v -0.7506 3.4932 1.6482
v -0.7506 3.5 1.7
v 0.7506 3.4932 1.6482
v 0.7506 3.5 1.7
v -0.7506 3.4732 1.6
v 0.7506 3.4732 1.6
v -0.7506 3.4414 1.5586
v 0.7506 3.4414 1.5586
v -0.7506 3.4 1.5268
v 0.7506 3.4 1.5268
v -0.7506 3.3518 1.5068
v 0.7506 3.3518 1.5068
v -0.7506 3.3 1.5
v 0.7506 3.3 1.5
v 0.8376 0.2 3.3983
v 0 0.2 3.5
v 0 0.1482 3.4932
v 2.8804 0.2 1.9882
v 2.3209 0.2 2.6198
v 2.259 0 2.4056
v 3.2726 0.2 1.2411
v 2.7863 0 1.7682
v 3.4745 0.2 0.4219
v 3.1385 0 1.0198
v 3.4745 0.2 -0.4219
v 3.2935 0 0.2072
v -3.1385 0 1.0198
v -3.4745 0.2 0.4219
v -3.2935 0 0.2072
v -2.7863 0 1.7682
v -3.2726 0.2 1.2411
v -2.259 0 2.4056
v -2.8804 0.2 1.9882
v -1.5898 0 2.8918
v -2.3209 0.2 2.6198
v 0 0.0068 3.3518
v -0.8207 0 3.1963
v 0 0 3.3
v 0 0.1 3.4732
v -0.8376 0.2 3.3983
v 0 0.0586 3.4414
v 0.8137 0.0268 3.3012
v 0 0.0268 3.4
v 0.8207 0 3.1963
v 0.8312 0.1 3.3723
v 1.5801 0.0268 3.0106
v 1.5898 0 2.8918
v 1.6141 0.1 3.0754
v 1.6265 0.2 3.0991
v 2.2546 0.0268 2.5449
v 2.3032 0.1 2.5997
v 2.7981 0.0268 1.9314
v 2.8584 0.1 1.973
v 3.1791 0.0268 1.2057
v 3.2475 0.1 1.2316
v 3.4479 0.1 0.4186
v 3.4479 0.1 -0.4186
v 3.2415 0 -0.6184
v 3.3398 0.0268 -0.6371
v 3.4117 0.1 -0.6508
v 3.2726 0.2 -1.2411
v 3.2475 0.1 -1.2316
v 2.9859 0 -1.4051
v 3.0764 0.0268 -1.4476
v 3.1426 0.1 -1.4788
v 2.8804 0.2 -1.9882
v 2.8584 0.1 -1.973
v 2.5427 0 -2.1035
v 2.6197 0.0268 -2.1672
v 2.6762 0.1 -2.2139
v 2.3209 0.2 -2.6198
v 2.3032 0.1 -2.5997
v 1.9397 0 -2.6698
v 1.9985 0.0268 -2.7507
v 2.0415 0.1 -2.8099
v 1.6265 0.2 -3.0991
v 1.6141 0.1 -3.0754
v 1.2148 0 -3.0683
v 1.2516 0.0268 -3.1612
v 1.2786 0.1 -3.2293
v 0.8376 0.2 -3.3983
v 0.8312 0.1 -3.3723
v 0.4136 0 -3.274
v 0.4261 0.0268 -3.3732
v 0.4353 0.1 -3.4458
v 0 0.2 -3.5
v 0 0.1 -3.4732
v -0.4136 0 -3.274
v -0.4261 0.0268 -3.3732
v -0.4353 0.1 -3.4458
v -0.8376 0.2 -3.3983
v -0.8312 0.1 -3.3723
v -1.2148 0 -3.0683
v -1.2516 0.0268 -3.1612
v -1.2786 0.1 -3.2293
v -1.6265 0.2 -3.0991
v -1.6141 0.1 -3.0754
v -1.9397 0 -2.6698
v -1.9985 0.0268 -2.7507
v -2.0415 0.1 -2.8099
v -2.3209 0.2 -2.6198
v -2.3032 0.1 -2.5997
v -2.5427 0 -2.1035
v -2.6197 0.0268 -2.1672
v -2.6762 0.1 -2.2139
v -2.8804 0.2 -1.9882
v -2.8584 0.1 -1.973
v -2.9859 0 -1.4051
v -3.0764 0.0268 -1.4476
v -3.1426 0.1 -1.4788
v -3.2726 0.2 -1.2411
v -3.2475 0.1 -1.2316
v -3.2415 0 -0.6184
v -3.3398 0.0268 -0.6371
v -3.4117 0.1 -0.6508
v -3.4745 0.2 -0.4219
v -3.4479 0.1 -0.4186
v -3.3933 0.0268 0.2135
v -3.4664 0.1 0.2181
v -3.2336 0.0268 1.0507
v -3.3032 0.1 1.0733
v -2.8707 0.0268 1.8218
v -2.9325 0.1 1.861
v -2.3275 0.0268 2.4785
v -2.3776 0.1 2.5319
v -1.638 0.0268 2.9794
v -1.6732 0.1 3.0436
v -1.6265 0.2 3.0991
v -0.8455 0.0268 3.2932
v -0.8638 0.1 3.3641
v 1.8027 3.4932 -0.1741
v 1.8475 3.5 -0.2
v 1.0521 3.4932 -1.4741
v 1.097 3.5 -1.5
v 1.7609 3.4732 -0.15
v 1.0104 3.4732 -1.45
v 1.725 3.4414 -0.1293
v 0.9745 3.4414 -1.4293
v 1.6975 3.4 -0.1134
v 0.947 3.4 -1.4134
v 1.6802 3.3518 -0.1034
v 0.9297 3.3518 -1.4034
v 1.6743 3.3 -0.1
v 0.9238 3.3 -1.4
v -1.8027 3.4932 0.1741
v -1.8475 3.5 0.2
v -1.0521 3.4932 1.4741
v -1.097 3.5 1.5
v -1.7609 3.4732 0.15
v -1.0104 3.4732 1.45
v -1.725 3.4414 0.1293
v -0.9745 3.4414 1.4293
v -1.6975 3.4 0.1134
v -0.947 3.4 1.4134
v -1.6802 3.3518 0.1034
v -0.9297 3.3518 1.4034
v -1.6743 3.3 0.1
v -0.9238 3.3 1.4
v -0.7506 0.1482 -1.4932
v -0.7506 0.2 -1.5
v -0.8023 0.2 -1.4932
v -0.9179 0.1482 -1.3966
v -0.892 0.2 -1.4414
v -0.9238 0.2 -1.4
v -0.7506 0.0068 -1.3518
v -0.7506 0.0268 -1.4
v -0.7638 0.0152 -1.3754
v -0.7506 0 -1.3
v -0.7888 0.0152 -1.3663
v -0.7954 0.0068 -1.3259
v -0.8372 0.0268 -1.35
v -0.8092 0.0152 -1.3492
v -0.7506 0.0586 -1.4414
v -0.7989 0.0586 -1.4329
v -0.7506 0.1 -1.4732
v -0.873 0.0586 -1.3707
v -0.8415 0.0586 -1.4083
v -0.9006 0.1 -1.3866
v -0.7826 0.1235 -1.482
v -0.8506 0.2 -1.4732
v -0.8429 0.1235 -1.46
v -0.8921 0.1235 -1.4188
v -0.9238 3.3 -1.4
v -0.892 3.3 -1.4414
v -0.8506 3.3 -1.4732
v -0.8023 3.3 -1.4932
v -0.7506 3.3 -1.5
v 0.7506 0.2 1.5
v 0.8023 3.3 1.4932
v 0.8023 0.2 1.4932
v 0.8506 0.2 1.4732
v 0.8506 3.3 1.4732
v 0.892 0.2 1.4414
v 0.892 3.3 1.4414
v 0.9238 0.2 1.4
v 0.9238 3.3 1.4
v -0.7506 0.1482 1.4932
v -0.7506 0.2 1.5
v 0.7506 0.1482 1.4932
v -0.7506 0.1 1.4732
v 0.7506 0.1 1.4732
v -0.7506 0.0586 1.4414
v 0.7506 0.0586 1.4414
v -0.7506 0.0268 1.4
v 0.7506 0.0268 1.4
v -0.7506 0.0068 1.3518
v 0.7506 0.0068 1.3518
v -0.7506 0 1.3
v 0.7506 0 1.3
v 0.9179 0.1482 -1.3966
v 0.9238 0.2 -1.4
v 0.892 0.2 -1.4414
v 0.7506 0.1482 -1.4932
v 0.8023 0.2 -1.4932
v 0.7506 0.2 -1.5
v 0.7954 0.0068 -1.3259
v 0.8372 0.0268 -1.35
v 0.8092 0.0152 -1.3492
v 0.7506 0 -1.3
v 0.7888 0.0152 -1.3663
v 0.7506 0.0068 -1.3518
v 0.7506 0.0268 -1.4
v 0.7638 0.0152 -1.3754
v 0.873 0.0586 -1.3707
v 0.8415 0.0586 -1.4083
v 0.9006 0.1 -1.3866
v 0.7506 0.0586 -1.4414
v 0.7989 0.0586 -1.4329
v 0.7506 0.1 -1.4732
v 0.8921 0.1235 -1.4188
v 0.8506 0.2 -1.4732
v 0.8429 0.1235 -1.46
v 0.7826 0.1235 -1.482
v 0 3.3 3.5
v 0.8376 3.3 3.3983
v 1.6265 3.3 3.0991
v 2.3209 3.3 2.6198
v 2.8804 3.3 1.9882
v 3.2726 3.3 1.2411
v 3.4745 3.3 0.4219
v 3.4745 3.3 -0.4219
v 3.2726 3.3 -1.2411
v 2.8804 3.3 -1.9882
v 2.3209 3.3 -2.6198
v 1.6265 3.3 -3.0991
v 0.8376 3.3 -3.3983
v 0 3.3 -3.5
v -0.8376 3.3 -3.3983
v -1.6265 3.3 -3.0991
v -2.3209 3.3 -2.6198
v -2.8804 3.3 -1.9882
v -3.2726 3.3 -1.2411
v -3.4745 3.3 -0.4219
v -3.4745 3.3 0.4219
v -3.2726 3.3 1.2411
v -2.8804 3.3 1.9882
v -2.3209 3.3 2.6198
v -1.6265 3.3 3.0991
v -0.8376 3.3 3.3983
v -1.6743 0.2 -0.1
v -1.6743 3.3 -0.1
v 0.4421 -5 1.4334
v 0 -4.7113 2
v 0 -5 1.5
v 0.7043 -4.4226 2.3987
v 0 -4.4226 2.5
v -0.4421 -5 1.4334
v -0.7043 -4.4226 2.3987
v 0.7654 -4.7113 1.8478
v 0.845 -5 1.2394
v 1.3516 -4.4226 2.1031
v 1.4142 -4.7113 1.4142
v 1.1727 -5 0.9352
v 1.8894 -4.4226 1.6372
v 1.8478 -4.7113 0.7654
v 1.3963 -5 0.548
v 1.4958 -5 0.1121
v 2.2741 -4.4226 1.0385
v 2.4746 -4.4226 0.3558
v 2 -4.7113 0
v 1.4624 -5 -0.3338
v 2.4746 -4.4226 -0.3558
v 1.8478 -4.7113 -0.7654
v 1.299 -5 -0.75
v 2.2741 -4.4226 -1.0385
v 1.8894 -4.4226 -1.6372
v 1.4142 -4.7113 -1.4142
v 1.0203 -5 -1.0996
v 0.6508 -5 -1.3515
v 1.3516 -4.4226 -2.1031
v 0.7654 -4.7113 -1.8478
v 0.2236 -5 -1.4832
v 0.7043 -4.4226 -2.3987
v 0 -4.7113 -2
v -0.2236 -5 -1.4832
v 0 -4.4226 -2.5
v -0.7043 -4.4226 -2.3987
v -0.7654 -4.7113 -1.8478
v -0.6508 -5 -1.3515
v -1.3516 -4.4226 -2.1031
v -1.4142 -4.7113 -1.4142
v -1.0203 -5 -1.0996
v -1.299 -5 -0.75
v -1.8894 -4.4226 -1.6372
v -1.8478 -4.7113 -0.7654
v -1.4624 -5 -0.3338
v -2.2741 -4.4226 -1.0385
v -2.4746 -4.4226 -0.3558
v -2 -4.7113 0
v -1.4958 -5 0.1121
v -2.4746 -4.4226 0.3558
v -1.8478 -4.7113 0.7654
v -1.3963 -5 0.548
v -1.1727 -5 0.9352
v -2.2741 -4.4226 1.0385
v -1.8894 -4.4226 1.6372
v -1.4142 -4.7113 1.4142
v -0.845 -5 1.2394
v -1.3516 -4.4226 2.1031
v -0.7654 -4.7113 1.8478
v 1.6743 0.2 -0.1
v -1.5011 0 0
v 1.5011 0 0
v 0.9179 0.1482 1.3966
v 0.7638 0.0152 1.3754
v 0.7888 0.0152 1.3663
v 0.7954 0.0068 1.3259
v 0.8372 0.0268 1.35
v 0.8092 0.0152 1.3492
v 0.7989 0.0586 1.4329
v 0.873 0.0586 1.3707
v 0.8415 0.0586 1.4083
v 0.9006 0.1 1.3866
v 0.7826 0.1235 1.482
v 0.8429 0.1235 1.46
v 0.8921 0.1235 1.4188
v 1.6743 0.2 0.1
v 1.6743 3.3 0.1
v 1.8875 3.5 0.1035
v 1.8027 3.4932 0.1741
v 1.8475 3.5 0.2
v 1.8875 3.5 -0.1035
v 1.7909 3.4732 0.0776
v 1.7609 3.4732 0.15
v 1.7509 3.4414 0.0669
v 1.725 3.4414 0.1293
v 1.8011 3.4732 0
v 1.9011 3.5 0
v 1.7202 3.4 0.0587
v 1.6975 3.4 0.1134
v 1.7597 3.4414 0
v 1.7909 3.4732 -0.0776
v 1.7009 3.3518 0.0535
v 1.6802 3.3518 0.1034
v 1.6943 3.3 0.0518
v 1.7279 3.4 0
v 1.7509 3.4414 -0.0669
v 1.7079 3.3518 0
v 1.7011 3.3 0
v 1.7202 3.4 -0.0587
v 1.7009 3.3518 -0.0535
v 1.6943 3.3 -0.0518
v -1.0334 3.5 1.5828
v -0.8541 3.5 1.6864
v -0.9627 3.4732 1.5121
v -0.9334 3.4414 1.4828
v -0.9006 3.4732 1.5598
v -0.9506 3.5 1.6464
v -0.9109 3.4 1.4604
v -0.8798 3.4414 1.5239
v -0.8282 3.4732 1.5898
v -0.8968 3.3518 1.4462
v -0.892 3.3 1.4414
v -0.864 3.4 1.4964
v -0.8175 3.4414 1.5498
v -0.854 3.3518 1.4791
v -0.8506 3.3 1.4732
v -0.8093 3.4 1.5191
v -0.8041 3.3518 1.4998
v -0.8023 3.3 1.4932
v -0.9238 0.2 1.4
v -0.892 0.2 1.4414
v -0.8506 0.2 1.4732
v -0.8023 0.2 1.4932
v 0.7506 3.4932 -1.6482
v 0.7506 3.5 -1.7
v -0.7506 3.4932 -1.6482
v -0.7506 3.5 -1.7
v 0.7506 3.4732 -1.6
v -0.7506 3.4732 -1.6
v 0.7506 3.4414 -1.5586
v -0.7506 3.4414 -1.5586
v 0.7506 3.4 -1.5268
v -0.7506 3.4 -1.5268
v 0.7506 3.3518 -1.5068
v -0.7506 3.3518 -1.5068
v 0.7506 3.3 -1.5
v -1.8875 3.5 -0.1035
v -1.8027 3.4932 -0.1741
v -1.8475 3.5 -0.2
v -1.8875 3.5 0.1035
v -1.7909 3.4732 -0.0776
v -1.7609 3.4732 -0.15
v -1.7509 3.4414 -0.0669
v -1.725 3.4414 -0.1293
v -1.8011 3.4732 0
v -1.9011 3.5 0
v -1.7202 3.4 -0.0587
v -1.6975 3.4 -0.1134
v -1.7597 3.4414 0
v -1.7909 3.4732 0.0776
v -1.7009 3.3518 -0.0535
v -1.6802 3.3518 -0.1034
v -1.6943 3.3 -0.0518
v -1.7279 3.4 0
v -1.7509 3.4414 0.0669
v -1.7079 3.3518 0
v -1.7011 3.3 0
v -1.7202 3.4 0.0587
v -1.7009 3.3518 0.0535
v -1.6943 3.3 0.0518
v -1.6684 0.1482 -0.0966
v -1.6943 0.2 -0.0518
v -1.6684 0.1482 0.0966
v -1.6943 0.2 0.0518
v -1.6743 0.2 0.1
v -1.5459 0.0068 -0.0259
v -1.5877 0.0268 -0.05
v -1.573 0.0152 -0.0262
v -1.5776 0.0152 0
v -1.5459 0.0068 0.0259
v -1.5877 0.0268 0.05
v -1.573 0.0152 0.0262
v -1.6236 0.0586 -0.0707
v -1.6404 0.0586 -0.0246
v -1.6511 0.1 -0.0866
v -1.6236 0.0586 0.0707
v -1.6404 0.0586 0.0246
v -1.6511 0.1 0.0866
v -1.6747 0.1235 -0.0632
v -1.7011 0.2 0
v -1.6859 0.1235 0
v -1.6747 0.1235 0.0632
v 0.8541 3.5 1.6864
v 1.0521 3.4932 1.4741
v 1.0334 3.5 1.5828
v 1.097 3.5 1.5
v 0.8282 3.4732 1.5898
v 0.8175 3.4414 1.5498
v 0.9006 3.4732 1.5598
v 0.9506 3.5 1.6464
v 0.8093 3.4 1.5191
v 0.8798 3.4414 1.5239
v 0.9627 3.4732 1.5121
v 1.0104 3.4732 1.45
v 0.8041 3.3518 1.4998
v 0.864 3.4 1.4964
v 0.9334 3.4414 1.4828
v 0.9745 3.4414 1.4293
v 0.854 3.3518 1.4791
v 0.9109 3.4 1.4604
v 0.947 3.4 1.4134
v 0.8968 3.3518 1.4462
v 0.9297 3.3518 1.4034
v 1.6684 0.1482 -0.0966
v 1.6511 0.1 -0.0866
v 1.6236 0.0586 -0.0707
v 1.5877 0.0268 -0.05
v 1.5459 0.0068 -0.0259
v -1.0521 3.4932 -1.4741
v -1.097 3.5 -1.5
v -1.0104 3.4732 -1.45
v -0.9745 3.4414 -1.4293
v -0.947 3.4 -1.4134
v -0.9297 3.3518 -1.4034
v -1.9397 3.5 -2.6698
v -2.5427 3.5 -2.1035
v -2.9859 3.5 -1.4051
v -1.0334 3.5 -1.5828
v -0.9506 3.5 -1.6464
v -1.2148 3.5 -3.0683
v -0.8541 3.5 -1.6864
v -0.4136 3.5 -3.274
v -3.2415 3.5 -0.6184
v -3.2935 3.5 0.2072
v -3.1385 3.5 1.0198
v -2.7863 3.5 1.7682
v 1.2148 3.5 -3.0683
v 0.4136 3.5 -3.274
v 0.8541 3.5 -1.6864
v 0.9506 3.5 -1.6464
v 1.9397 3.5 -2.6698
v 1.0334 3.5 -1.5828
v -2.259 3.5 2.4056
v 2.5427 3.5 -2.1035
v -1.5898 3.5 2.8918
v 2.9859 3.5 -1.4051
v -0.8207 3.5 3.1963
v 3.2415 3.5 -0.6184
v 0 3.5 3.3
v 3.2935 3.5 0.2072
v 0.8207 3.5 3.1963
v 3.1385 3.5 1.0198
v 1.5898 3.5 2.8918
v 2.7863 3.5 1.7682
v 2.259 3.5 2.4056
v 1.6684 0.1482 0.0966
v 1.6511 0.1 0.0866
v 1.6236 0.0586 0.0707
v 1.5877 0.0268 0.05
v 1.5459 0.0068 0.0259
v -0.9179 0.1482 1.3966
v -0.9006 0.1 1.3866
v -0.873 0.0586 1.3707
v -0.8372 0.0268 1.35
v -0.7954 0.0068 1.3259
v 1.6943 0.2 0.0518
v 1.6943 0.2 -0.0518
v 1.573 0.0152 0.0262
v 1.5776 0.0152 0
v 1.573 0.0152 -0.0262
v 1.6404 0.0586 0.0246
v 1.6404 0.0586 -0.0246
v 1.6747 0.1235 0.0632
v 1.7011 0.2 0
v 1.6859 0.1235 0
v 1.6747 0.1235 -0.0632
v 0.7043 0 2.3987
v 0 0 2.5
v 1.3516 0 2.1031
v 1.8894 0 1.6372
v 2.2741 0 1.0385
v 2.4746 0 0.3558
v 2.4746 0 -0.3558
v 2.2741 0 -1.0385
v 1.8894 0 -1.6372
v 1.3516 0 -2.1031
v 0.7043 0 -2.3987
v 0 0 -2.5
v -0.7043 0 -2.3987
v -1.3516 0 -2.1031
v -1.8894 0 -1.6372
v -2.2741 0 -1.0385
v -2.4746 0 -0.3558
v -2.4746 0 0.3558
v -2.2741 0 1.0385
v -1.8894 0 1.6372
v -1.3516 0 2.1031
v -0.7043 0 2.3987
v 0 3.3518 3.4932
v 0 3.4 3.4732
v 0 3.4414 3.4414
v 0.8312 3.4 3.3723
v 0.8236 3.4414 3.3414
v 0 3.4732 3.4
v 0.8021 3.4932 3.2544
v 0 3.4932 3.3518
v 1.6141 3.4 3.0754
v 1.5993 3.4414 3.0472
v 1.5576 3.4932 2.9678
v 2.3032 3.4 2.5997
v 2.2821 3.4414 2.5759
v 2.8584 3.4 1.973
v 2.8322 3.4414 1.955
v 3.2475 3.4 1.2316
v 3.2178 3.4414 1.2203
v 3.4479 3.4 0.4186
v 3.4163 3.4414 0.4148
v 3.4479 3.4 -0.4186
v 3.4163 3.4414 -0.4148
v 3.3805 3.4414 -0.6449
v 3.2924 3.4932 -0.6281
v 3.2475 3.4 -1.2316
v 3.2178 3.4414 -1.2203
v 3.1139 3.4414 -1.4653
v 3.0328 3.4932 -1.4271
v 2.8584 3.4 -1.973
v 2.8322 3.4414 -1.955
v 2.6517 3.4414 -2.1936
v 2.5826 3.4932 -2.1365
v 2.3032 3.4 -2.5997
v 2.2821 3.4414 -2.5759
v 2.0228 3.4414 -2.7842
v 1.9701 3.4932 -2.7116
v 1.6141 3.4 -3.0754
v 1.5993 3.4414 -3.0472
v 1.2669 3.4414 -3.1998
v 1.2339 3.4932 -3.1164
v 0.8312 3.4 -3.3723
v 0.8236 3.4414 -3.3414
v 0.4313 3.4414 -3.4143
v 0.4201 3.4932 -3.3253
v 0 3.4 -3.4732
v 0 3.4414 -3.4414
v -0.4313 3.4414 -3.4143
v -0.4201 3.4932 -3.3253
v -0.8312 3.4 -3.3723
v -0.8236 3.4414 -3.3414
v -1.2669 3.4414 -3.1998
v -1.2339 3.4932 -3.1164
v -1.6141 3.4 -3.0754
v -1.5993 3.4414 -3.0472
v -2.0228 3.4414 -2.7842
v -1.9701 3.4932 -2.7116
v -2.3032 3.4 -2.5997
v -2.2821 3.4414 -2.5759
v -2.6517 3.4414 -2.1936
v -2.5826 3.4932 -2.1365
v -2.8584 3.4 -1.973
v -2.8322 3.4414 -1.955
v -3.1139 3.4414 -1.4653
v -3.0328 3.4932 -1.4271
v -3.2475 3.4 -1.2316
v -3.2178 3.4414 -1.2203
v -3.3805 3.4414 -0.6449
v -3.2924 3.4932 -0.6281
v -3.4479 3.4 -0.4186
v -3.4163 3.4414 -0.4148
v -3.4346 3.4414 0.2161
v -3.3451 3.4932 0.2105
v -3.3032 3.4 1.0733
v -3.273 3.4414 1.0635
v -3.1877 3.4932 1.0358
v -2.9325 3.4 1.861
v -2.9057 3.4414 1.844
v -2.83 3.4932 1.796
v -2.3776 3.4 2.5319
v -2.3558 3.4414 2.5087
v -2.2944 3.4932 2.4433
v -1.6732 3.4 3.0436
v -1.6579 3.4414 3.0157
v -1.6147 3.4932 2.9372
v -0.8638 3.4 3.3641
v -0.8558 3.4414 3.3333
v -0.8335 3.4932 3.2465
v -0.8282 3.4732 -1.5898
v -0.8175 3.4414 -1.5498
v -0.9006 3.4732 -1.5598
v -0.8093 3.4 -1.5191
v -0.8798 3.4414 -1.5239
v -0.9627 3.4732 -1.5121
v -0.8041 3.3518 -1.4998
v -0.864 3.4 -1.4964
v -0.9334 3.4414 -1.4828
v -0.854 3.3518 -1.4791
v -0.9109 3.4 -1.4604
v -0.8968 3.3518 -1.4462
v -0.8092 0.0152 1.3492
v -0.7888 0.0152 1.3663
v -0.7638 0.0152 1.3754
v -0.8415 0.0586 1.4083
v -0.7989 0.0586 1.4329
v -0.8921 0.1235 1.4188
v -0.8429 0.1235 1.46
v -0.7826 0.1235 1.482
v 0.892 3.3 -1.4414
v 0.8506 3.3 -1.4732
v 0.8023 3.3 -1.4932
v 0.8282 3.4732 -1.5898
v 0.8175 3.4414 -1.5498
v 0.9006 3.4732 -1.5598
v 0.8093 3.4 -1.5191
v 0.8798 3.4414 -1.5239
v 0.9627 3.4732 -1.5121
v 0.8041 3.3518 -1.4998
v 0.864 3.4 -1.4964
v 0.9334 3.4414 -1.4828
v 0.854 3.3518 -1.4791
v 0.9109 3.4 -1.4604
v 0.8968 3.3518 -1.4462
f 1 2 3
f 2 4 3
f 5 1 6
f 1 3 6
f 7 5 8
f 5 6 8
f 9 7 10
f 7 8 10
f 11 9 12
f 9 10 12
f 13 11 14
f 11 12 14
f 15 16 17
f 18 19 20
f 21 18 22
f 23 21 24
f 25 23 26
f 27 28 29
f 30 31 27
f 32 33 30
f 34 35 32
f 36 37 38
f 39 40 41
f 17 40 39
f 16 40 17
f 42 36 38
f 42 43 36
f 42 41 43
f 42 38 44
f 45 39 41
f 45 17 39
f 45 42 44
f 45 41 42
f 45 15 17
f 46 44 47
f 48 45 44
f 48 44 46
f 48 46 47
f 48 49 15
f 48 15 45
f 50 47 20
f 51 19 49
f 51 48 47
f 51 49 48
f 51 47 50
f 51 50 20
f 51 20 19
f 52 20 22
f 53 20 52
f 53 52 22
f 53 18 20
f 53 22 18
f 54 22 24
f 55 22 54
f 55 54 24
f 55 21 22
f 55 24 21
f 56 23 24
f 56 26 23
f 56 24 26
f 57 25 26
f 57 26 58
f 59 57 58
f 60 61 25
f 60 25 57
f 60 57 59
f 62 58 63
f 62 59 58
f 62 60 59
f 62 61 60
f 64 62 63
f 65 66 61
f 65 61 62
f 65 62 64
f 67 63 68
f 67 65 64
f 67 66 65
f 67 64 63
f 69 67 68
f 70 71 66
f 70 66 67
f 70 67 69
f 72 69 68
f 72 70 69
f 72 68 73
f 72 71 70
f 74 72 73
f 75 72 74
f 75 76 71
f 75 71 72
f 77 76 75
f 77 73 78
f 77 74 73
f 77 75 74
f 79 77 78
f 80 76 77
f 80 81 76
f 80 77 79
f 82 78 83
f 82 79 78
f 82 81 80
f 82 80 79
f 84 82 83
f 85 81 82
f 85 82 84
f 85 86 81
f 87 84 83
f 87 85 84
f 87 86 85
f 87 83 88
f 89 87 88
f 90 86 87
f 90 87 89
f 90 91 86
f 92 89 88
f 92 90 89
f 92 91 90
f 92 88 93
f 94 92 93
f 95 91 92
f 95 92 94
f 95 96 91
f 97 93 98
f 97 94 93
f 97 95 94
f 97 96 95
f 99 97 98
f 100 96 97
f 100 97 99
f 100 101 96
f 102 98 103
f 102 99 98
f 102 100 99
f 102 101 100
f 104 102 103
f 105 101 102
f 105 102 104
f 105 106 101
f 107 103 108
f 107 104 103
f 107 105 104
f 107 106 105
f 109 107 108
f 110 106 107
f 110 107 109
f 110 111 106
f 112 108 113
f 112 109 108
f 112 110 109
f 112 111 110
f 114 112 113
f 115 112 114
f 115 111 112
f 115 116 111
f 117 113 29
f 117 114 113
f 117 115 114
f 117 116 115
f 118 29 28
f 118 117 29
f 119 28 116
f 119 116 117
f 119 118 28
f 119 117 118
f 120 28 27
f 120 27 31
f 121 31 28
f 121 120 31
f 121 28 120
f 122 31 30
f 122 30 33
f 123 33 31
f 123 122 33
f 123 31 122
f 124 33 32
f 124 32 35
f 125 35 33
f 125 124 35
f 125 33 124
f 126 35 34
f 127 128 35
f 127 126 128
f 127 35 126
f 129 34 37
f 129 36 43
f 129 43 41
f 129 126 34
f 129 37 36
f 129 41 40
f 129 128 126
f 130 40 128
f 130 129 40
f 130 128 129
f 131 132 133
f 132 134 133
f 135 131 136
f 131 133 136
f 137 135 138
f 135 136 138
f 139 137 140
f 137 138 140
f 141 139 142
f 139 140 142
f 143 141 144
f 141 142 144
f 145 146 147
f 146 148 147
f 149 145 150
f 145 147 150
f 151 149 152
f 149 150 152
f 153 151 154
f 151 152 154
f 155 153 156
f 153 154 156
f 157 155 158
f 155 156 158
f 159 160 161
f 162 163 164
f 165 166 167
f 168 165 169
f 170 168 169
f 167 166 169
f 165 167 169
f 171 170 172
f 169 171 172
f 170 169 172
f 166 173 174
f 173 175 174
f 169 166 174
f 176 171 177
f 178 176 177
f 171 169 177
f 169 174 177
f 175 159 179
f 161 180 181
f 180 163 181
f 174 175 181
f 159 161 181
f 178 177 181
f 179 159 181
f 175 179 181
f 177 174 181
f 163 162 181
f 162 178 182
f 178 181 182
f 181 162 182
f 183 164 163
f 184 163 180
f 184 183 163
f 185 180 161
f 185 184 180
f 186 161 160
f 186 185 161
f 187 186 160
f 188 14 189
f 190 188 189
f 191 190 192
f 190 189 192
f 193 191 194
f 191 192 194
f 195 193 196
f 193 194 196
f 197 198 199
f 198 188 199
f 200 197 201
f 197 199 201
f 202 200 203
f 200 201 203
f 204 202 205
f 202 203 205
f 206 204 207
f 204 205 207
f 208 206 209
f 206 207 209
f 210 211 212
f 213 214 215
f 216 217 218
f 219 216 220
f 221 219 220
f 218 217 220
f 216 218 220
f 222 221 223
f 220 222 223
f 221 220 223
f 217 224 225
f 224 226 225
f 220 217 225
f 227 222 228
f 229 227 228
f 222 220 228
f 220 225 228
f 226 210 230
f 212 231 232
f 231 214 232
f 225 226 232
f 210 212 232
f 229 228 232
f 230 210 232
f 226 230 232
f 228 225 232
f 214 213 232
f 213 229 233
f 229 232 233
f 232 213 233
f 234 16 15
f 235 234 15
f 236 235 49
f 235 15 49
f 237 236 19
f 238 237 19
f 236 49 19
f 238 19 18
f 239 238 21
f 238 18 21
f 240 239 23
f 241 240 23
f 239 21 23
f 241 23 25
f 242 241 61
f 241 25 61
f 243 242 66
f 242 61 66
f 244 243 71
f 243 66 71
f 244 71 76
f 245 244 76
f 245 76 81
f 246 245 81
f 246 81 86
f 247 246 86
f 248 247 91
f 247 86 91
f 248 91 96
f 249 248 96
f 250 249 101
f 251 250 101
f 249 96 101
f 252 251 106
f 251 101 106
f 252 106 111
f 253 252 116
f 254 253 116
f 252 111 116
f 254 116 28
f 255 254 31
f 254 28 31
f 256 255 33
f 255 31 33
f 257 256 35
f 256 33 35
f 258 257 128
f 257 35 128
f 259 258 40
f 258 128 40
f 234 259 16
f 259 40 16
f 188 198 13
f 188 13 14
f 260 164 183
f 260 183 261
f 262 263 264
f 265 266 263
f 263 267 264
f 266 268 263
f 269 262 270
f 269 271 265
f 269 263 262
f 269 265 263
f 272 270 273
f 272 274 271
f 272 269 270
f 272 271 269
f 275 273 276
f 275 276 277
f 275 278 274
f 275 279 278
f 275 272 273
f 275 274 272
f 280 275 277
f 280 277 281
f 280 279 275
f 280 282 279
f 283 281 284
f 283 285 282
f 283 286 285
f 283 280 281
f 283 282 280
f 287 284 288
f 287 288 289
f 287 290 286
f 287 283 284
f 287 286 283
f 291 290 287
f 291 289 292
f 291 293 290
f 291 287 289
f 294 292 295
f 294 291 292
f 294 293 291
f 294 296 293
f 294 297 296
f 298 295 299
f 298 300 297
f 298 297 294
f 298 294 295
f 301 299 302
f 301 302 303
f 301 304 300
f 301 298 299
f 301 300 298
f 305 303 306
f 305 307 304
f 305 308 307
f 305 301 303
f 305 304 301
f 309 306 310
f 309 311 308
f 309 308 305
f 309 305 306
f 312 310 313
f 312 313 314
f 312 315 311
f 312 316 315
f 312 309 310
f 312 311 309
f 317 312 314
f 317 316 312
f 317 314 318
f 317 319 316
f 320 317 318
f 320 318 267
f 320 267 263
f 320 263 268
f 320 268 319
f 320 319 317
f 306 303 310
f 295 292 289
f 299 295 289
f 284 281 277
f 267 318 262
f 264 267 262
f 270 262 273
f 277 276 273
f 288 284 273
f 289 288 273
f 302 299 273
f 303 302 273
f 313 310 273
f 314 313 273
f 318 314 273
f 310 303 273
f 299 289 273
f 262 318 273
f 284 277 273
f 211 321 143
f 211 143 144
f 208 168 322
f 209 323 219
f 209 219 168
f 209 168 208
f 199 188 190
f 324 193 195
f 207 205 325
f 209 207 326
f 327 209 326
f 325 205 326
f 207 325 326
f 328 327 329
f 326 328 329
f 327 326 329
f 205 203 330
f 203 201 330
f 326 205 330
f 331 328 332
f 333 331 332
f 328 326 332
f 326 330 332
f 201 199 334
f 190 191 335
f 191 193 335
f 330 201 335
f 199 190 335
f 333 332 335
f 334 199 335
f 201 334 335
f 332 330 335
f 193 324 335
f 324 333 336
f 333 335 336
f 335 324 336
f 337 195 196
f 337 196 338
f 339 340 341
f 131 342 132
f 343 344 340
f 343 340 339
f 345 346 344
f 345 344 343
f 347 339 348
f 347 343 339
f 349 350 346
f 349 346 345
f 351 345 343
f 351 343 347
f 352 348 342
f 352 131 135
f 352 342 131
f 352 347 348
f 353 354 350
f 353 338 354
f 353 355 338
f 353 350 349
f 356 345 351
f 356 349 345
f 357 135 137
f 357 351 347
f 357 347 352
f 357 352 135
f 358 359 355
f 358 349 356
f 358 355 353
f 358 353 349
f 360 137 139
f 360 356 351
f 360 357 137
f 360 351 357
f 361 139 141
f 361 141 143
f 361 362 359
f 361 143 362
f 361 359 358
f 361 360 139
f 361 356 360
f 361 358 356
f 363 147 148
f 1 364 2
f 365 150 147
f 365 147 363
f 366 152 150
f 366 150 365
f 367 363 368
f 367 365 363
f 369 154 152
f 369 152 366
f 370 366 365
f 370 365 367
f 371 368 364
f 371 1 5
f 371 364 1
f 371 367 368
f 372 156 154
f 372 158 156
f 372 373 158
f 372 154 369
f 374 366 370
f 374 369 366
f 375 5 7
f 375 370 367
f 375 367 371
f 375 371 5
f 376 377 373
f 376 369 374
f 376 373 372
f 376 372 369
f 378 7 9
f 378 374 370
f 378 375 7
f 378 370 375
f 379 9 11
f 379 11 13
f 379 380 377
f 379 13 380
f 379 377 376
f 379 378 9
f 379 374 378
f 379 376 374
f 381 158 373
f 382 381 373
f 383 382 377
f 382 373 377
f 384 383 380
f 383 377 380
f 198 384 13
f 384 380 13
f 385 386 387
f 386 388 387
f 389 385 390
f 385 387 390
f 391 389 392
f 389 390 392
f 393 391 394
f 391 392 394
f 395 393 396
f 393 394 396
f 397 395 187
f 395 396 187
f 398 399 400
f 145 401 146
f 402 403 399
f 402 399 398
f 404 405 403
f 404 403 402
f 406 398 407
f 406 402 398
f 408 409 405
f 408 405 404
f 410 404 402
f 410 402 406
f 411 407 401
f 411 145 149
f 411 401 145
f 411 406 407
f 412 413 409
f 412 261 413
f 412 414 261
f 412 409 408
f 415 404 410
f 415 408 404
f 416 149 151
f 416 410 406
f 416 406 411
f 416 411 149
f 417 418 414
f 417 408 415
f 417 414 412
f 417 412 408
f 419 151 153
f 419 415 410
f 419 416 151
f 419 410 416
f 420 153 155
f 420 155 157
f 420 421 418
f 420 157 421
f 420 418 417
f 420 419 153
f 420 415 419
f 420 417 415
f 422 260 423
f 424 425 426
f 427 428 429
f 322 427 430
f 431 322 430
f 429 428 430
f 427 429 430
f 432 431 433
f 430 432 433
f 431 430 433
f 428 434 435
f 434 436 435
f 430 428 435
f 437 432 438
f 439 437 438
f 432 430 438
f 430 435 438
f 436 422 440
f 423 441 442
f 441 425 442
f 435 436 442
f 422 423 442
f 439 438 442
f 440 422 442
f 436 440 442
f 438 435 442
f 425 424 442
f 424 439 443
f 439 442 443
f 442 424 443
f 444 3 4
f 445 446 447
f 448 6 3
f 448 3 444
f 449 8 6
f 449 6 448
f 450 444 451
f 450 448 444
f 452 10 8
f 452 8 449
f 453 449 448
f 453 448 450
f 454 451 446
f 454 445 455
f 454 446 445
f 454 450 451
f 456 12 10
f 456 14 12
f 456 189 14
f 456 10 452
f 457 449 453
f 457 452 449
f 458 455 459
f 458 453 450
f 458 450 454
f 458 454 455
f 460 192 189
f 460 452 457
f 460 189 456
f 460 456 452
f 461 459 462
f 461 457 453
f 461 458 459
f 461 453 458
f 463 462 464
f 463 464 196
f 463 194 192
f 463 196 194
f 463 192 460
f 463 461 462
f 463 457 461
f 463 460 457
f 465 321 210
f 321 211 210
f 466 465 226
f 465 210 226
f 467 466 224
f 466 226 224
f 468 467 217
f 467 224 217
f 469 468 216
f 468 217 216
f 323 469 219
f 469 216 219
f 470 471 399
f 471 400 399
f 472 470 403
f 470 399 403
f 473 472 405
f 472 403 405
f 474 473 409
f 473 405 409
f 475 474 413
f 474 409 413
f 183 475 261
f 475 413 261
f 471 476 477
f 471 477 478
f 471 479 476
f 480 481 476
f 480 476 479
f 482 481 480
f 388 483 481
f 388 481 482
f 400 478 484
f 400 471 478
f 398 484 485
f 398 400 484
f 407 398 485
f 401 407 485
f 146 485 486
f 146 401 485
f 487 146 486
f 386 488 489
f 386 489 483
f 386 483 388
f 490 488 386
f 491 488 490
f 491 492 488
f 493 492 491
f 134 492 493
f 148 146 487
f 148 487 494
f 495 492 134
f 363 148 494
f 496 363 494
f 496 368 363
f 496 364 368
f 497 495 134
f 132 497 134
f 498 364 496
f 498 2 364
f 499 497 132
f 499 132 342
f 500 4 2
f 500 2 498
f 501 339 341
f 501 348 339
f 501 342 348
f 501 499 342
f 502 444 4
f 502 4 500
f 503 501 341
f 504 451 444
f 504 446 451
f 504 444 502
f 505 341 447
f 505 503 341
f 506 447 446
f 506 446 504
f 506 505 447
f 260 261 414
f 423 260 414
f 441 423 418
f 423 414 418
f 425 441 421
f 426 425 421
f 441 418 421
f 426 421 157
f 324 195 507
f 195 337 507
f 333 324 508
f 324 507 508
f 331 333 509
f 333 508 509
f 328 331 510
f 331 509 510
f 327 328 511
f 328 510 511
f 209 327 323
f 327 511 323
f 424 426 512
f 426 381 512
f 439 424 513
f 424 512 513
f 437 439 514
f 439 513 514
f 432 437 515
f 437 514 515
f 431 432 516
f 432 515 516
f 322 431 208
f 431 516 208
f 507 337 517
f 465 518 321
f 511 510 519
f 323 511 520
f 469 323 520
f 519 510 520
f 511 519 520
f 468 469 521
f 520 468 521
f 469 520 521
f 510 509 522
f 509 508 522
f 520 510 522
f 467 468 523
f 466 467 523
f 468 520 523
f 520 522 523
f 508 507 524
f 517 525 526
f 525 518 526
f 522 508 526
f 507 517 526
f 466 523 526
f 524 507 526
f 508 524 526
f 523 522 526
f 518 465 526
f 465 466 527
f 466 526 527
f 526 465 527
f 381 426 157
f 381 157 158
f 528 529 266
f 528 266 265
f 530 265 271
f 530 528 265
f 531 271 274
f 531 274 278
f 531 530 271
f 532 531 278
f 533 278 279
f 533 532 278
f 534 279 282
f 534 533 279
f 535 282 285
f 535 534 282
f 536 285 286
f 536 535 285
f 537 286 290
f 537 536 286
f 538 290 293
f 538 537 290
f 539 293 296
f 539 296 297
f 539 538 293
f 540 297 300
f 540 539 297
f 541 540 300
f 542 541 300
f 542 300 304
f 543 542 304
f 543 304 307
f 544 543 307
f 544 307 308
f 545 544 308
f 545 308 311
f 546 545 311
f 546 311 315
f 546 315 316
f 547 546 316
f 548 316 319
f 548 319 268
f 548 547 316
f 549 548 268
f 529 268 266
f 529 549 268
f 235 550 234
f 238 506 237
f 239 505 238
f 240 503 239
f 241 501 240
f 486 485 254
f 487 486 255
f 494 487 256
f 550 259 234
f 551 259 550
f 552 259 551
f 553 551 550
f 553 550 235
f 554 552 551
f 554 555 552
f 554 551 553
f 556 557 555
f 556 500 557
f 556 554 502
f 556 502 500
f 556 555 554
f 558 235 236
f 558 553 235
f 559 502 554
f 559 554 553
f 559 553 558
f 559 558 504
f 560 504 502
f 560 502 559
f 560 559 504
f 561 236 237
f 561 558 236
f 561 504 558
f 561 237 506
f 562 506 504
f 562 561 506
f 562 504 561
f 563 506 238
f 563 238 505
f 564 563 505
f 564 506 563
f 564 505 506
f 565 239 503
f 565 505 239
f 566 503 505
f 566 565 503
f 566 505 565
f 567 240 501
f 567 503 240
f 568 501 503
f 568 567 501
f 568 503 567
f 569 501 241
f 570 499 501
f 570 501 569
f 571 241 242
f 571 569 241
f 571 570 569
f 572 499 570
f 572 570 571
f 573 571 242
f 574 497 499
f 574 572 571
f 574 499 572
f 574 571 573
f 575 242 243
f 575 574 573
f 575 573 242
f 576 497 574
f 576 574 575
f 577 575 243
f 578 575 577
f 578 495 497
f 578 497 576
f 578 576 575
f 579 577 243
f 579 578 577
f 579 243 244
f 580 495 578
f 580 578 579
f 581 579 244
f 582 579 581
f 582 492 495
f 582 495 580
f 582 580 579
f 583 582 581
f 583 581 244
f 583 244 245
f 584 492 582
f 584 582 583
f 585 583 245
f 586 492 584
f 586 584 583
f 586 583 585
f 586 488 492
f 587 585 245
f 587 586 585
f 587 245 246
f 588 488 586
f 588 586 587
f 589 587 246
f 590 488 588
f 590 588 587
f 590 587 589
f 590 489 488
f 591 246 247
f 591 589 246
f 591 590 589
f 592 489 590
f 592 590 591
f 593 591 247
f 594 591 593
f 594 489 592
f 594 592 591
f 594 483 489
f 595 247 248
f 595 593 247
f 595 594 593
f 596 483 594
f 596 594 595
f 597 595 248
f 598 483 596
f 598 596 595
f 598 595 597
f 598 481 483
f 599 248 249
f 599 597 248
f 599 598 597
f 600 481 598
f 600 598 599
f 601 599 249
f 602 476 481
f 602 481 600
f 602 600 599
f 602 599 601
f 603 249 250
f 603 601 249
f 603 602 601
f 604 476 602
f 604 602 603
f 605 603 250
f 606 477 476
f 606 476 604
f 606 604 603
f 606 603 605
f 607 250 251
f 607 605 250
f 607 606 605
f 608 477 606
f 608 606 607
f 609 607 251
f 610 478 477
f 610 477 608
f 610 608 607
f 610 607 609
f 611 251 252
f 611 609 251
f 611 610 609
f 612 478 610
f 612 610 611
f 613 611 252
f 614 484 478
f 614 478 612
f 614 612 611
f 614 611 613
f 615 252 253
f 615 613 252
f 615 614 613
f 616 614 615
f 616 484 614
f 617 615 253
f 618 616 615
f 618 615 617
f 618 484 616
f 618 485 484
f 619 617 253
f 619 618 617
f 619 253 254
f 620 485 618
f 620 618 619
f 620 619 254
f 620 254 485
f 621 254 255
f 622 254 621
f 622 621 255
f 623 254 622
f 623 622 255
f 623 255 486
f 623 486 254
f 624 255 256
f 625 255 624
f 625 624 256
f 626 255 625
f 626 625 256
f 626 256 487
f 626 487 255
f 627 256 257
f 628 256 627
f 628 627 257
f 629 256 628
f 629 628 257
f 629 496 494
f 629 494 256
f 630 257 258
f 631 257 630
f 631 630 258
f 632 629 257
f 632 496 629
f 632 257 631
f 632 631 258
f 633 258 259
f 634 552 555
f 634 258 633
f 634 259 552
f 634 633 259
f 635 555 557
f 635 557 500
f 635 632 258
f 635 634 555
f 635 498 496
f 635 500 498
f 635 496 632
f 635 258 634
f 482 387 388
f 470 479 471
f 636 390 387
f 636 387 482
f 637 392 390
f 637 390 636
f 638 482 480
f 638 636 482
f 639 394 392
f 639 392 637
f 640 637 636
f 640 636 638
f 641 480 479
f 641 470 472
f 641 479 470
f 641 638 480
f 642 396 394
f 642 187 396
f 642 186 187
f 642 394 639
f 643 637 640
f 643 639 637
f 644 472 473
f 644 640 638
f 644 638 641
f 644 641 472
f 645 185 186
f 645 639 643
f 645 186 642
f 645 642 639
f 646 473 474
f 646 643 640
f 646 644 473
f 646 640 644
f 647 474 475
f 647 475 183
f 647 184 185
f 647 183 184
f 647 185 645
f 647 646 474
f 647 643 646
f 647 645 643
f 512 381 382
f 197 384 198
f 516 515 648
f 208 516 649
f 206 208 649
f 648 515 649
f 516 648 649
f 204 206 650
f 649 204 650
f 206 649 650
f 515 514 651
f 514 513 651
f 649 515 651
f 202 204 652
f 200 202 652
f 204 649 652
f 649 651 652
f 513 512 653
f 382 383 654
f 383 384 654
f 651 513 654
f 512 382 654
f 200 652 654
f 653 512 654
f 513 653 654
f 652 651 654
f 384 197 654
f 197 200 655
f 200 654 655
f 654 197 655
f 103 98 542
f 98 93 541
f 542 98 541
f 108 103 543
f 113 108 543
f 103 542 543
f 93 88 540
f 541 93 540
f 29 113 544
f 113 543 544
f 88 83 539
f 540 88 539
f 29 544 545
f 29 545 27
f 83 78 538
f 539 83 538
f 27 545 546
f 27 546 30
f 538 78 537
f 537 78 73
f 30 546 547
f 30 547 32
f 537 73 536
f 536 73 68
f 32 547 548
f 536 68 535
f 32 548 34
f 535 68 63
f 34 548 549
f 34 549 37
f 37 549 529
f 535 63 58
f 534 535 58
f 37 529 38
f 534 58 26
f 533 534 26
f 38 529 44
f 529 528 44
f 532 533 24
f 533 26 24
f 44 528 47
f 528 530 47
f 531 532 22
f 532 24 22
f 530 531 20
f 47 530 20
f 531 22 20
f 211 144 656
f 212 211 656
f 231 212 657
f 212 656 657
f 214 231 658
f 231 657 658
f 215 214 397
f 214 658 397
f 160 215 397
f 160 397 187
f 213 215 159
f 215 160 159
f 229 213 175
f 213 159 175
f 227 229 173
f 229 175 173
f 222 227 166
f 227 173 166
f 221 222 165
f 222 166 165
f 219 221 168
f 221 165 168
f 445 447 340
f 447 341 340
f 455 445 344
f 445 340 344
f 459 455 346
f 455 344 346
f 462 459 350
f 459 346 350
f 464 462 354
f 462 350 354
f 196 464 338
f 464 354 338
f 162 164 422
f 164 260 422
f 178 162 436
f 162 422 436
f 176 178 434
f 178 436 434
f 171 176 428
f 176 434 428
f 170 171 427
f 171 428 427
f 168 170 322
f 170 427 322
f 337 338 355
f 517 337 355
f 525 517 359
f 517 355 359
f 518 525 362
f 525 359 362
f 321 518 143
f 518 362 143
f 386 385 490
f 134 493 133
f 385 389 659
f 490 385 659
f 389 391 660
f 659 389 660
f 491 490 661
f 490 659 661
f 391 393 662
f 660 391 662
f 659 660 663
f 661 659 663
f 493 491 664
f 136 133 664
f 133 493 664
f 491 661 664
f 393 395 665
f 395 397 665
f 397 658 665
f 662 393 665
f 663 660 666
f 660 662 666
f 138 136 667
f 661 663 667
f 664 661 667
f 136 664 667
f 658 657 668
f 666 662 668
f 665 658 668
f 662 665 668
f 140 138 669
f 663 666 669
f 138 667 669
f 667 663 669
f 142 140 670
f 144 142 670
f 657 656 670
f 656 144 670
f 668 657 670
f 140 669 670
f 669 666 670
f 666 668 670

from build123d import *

# Parameters (mm, degrees)
HEAD_SKETCH_R                  = 3.5
HEAD_DEPTH                     = 3.5
THREADED_SECTION_STUB_SKETCH_R = 2.5
THREADED_SECTION_DEPTH         = 5
COSMETIC_FILLETS_R             = 0.2
BOTTOM_CHAMFER_SIZE            = 1
BOTTOM_CHAMFER_SIZE2           = 0.577350269


with BuildPart() as part:
    # Head Sketch → Head (new body)
    with BuildSketch(Plane(origin=(0, 0, 0), x_dir=(1, 0, 0), z_dir=(0, 1, 0))):
        with Locations(Location((0, 0, 0), (0, 0, 270))):
            Circle(HEAD_SKETCH_R)
        Polygon((-0.866025404, 1.5), (-1.732050808, 0), (-0.866025404, -1.5), (0.866025404, -1.5), (1.732050808, 0), (0.866025404, 1.5), align=None, mode=Mode.SUBTRACT)
    extrude(amount=HEAD_DEPTH)

    # Threaded Section Stub Sketch → Threaded Section (add)
    with BuildSketch(Plane(origin=(0, 0, 0), x_dir=(1, 0, 0), z_dir=(0, 1, 0))):
        with Locations(Location((0, 0, 0), (0, 0, 270))):
            Circle(THREADED_SECTION_STUB_SKETCH_R)
    extrude(amount=-THREADED_SECTION_DEPTH)

    # Cosmetic Fillets
    cosmetic_fillets_edges = [part.edges().sort_by_distance(p)[0] for p in [
        (-0.866025404, 1.75, -1.5),
        (-1.299038106, 0, 0.75),
        (-1.732050808, 1.75, 0),
        (0, 0, 1.5),
        (-0.866025404, 1.75, 1.5),
        (1.299038106, 0, 0.75),
        (0.866025404, 1.75, 1.5),
        (1.299038106, 0, -0.75),
        (1.732050808, 1.75, 0),
        (0, 3.5, -1.5),
        (-1.299038106, 3.5, -0.75),
        (-1.299038106, 3.5, 0.75),
        (0, 3.5, 1.5),
        (1.299038106, 3.5, 0.75),
        (1.299038106, 3.5, -0.75),
        (0, 0, -3.5),
        (0, 3.5, -3.5),
        (0, 0, -1.5),
        (0.866025404, 1.75, -1.5),
        (-1.299038106, 0, -0.75),
    ]]
    fillet(cosmetic_fillets_edges, radius=COSMETIC_FILLETS_R)

    # Bottom Chamfer
    bottom_chamfer_edges = [part.edges().sort_by_distance(p)[0] for p in [
        (0, -5, -2.5),
    ]]
    bottom_chamfer_side = [part.faces().sort_by_distance(p)[0] for p in [
        (0, -5, 0),
    ]]
    chamfer(bottom_chamfer_edges, length=BOTTOM_CHAMFER_SIZE, length2=BOTTOM_CHAMFER_SIZE2, reference=bottom_chamfer_side[0])


solid = part.part
